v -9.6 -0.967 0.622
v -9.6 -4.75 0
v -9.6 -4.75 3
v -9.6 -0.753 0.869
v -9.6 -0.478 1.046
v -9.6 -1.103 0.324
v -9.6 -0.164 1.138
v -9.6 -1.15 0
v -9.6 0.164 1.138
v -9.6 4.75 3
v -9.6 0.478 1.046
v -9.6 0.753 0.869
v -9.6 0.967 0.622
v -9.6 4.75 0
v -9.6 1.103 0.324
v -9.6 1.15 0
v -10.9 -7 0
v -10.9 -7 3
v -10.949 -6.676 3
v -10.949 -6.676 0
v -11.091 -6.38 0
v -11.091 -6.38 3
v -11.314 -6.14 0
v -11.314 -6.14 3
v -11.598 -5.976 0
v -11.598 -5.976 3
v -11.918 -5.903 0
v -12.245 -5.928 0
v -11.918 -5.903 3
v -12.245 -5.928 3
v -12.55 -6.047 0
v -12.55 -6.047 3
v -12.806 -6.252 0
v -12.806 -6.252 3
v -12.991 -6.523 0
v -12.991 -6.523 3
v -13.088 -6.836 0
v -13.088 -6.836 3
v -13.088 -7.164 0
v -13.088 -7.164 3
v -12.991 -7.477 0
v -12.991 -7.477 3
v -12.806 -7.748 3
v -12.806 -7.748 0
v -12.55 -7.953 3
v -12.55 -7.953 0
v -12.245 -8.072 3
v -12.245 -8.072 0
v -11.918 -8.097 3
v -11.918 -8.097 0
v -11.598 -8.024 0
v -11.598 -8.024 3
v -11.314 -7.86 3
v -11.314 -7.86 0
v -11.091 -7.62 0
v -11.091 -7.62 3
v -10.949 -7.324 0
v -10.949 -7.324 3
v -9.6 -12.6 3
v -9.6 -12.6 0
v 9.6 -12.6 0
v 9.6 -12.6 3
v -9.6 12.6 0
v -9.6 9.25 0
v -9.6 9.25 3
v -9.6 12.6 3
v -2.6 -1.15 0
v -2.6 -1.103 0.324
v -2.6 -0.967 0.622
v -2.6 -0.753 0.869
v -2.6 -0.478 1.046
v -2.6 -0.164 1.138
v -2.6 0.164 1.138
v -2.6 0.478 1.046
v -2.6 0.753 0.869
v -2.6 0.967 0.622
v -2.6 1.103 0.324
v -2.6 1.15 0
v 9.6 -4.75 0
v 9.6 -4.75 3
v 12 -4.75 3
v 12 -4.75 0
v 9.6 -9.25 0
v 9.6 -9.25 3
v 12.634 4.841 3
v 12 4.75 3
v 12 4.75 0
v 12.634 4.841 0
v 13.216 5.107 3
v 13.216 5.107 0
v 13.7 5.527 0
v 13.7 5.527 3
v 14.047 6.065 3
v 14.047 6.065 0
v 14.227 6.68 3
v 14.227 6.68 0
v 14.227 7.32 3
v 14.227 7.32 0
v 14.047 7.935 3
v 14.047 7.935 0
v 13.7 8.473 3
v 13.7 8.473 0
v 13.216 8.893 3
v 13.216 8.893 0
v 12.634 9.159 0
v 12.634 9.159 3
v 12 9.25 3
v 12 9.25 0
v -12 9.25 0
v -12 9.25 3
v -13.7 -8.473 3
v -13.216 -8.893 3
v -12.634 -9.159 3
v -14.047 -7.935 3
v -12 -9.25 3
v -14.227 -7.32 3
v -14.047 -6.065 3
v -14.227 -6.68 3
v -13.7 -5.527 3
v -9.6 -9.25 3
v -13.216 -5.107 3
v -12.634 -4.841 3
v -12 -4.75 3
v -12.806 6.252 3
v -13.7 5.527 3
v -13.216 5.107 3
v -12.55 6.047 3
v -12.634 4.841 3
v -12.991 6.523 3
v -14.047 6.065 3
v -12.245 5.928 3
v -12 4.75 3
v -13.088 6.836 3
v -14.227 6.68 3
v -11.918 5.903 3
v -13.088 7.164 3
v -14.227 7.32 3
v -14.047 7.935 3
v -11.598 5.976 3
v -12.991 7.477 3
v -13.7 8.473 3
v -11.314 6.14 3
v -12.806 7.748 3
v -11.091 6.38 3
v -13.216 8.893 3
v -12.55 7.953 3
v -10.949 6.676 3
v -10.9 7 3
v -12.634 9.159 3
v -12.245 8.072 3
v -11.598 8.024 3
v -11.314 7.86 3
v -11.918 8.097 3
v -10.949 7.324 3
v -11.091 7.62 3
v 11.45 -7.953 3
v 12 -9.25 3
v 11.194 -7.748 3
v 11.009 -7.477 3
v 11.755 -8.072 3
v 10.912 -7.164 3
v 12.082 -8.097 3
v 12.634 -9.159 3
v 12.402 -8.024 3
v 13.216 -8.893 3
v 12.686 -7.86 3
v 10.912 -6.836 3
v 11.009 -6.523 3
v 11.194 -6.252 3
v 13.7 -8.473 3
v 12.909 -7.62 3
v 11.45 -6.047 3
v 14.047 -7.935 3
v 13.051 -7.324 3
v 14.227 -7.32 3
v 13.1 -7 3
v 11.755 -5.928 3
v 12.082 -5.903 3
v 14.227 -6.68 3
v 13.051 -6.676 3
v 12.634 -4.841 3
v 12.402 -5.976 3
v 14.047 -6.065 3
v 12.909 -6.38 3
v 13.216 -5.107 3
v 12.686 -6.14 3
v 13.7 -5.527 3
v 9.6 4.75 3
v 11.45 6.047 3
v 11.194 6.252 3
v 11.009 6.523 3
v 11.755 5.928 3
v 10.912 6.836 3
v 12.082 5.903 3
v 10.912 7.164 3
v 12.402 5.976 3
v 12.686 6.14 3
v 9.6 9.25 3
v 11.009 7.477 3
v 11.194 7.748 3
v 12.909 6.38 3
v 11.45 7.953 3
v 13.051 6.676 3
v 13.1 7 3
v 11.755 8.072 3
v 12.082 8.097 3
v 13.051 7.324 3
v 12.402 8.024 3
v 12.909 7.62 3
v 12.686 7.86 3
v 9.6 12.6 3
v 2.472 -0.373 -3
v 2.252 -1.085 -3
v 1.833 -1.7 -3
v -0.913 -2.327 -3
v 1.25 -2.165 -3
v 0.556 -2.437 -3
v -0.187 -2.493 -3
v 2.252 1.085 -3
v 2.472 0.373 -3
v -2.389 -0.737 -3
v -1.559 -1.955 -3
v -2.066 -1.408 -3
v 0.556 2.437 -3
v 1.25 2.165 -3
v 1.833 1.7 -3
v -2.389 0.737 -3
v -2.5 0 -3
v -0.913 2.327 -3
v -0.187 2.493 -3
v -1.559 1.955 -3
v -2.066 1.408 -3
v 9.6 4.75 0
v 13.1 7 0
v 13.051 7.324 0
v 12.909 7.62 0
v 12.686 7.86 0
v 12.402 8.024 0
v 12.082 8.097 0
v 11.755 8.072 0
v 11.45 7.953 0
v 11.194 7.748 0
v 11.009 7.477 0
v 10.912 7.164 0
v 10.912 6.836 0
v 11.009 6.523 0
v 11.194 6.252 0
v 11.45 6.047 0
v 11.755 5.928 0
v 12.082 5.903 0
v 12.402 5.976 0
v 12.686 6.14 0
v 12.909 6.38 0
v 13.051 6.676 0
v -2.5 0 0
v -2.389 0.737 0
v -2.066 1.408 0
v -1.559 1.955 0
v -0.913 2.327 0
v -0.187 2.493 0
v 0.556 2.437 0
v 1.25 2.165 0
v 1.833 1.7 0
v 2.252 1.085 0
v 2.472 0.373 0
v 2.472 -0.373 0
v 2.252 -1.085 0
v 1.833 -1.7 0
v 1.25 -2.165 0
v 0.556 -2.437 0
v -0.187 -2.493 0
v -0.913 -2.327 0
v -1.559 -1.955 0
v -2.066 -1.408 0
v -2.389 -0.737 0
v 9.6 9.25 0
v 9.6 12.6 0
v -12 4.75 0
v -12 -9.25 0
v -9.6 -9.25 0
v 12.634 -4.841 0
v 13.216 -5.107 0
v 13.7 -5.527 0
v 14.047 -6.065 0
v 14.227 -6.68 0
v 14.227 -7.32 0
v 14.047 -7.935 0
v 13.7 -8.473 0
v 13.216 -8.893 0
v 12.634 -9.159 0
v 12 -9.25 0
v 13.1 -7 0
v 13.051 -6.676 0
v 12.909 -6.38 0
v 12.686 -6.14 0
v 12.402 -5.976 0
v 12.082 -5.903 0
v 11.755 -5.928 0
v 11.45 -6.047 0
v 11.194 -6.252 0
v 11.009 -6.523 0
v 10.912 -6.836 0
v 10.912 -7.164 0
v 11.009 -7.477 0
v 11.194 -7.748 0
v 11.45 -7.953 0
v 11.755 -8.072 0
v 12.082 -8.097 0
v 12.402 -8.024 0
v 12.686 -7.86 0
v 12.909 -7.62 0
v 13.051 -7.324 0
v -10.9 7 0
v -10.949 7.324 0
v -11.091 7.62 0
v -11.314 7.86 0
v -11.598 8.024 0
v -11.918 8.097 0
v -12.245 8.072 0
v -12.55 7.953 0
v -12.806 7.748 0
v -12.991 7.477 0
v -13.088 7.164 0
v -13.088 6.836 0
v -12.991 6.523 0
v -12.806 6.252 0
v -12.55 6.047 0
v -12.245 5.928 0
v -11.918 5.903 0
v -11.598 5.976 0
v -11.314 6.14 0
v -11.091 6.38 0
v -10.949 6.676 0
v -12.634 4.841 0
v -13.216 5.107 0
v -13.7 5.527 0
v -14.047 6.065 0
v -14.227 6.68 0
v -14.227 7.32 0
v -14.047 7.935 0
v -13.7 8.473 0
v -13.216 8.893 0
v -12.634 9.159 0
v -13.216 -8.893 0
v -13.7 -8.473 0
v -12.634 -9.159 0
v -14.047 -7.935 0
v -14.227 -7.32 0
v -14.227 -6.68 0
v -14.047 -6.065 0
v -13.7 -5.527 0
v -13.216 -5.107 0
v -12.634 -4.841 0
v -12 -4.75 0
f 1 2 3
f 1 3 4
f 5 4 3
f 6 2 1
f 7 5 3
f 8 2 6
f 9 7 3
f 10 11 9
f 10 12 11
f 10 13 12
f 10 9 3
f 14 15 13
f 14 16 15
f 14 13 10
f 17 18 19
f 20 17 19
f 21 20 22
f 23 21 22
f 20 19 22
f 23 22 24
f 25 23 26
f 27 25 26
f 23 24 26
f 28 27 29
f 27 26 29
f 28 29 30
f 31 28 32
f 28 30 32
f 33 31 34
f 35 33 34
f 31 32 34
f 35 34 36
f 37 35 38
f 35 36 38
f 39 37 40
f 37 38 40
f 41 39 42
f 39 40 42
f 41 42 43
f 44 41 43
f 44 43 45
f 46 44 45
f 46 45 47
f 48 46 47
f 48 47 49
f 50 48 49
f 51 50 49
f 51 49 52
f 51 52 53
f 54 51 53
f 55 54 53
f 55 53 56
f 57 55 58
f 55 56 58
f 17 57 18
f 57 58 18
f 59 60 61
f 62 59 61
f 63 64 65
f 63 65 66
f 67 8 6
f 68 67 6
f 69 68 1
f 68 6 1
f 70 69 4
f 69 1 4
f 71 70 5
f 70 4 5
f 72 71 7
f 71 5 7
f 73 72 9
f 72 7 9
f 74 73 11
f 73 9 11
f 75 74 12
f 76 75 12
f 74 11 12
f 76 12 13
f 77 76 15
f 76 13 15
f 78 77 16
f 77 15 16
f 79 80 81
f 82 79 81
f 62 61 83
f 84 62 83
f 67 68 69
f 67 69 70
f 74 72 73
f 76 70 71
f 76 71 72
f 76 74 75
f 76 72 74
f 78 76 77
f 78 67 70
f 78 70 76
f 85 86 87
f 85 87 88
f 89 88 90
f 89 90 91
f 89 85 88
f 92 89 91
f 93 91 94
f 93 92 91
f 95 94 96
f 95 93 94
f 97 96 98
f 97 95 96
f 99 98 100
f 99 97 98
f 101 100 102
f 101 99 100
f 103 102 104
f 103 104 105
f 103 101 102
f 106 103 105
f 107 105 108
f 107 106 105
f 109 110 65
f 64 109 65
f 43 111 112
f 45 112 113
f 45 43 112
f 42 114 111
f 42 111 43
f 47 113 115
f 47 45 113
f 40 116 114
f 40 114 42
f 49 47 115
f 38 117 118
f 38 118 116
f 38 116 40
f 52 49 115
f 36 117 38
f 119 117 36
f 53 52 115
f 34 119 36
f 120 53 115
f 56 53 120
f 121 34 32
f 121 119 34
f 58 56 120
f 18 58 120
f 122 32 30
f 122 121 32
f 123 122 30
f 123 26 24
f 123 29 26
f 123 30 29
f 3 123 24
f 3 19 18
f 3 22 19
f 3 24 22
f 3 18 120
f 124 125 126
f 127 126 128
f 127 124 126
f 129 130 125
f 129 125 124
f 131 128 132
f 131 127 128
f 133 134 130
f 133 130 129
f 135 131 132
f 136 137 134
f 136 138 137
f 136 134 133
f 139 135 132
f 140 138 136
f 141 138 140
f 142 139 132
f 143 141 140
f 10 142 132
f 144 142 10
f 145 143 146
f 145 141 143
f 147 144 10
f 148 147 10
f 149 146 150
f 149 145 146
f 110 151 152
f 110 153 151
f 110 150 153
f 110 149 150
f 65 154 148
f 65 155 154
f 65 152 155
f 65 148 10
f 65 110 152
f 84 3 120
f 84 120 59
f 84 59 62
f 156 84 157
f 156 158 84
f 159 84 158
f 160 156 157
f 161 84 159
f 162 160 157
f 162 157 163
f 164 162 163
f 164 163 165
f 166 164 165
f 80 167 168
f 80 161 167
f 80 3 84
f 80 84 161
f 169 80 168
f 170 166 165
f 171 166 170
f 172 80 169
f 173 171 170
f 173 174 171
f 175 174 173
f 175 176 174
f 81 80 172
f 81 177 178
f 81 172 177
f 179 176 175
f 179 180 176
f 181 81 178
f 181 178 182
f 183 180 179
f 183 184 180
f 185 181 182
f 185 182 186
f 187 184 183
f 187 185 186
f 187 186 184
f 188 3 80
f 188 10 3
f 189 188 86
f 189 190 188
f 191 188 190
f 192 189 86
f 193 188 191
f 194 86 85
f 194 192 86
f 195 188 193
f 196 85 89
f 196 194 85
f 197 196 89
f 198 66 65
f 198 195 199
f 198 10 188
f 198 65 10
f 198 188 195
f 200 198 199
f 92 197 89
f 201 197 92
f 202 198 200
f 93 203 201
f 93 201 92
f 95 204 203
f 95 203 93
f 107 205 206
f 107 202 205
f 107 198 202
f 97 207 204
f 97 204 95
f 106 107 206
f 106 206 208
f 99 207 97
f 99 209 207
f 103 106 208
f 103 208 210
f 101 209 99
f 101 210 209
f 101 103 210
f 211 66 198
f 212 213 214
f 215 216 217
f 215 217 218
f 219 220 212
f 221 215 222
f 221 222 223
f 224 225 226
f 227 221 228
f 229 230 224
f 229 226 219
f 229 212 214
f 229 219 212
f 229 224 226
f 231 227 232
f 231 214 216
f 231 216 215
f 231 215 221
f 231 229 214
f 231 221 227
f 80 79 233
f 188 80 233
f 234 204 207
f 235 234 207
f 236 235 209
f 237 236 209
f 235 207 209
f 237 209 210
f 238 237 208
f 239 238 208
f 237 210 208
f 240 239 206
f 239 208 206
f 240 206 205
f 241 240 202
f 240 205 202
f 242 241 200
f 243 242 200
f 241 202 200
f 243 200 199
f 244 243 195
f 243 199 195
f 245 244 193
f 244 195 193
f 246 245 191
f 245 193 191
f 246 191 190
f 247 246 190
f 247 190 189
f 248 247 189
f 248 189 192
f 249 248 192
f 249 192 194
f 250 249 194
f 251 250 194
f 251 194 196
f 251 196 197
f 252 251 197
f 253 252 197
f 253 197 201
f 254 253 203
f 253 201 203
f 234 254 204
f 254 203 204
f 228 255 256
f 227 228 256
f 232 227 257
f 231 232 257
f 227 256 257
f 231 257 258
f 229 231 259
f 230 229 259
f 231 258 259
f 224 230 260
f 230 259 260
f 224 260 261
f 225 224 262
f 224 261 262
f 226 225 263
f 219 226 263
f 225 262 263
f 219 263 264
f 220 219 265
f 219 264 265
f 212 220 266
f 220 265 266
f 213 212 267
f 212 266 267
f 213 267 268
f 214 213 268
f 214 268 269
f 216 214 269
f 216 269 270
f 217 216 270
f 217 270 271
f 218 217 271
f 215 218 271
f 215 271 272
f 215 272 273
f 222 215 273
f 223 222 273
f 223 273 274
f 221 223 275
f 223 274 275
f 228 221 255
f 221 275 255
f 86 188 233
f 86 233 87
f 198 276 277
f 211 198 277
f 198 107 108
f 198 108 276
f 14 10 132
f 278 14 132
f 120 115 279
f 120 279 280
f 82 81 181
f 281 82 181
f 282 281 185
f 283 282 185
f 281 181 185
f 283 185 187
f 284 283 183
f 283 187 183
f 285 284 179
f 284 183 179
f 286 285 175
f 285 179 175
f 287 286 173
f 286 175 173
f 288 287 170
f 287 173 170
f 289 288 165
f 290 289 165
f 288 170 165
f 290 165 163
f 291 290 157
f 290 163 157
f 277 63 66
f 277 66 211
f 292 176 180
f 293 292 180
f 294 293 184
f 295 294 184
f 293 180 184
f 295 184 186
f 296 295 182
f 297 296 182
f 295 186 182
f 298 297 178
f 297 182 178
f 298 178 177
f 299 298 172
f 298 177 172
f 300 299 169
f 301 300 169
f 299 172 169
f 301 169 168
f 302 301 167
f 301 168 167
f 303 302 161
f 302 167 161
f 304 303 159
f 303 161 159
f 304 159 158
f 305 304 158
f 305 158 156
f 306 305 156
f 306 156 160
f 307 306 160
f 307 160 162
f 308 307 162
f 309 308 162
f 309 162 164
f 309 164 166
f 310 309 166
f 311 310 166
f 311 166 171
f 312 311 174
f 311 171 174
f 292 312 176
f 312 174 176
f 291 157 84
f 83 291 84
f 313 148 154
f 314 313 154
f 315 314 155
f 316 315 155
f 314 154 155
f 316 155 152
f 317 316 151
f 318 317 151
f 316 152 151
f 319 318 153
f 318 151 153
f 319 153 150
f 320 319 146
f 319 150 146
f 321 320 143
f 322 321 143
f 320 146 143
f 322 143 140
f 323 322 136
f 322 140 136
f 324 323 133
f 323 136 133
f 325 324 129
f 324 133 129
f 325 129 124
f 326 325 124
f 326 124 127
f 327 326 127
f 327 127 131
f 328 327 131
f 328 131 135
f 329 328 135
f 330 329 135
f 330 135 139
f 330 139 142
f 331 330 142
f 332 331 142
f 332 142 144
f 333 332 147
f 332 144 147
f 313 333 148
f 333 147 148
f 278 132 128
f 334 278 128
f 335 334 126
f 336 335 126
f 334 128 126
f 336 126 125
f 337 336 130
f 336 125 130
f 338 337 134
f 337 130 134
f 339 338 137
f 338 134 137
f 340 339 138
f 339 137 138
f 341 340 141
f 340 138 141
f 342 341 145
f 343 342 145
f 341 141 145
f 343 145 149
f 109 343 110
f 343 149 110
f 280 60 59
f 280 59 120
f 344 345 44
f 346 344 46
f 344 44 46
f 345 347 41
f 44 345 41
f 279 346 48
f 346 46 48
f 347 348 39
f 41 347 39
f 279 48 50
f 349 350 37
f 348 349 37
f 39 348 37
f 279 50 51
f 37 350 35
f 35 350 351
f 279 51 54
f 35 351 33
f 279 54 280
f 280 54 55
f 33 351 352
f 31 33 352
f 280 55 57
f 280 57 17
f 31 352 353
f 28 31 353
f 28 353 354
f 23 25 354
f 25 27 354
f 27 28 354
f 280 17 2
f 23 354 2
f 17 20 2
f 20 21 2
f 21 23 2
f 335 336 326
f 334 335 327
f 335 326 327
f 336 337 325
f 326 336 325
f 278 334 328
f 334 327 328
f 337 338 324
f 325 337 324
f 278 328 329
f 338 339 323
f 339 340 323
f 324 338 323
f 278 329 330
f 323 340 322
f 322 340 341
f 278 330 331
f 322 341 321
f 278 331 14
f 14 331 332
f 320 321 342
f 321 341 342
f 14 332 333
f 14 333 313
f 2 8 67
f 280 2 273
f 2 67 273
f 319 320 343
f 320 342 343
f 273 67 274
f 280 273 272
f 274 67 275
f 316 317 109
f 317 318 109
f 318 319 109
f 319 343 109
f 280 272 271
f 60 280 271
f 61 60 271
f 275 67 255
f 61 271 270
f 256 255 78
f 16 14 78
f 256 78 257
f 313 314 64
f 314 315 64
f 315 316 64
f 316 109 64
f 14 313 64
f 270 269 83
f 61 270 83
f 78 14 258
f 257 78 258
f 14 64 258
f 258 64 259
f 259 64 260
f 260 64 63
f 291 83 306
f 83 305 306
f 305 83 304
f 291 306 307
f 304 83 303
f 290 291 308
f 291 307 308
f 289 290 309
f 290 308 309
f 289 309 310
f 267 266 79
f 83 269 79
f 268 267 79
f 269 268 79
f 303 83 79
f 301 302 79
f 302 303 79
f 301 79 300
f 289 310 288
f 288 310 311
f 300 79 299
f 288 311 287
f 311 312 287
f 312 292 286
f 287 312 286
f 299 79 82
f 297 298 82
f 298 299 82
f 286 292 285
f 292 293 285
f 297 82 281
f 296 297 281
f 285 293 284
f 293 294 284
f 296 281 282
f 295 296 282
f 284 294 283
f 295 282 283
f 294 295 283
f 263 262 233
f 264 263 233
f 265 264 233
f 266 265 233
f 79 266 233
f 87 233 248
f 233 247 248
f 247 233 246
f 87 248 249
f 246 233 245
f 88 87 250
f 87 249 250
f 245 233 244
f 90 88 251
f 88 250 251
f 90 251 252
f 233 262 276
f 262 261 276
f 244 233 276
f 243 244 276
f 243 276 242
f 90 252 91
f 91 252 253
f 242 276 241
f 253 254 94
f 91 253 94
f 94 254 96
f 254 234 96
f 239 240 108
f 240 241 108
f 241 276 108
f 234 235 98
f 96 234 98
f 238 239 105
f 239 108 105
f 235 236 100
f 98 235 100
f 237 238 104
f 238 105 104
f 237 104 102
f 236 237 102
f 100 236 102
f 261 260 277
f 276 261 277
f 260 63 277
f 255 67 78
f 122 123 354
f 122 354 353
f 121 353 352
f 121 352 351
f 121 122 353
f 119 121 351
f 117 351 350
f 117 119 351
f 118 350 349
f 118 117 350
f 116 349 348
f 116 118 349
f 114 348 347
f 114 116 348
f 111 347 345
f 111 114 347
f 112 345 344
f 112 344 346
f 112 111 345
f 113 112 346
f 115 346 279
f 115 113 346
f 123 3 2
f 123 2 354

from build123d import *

# Parameters (mm, degrees)
SKETCH_1_W          = 19.2
SKETCH_1_H          = 25.2
EXTRUDE_1_DEPTH     = 3
SKETCH_3_R          = 1.1
EXTRUDE_2_DEPTH     = 3
SKETCH_4_R          = 1.15
CUT_EXTRUDE_1_DEPTH = 7
SKETCH_5_R          = 2.5
EXTRUDE_3_DEPTH     = 3


with BuildPart() as part:
    # 草图1 → 凸台-拉伸1 (new body)
    with BuildSketch(Plane.XY):
        Rectangle(SKETCH_1_W, SKETCH_1_H)
    extrude(amount=EXTRUDE_1_DEPTH)

    # 草图3 → 凸台-拉伸2 (add, through all)
    with BuildSketch(Plane.XY.offset(3)):
        with BuildLine():
            Line((12, 9.25), (9.6, 9.25))
            Line((9.6, 9.25), (9.6, 4.75))
            Line((9.6, 4.75), (12, 4.75))
            ThreePointArc((12, 4.75), (14.25, 7), (12, 9.25))
        make_face()
        with Locations((12, 7)):
            Circle(SKETCH_3_R, mode=Mode.SUBTRACT)
        with BuildLine():
            Line((9.6, -9.25), (9.6, -4.75))
            Line((9.6, -4.75), (12, -4.75))
            ThreePointArc((12, -4.75), (14.25, -7), (12, -9.25))
            Line((12, -9.25), (9.6, -9.25))
        make_face()
        with Locations((12, -7)):
            Circle(SKETCH_3_R, mode=Mode.SUBTRACT)
        with BuildLine():
            Line((-12, -9.25), (-9.6, -9.25))
            Line((-9.6, -9.25), (-9.6, -4.75))
            Line((-9.6, -4.75), (-12, -4.75))
            ThreePointArc((-12, -4.75), (-14.25, -7), (-12, -9.25))
        make_face()
        with Locations((-12, -7)):
            Circle(SKETCH_3_R, mode=Mode.SUBTRACT)
        with BuildLine():
            Line((-9.6, 9.25), (-9.6, 4.75))
            Line((-9.6, 4.75), (-12, 4.75))
            ThreePointArc((-12, 4.75), (-14.25, 7), (-12, 9.25))
            Line((-12, 9.25), (-9.6, 9.25))
        make_face()
        with Locations((-12, 7)):
            Circle(SKETCH_3_R, mode=Mode.SUBTRACT)
    extrude_2 = extrude(amount=-EXTRUDE_2_DEPTH)

    # 镜向1: 凸台-拉伸2 across plane
    add(extrude_2.mirror(Plane.ZX))

    # 草图4 → 切除-拉伸1 (cut)
    with BuildSketch(Plane(origin=(-9.6, 3, 0), x_dir=(0, 1, 0), z_dir=(-1, 0, 0))):
        with Locations((-3, 0)):
            Circle(SKETCH_4_R)
    extrude(amount=-CUT_EXTRUDE_1_DEPTH, mode=Mode.SUBTRACT)

    # 草图5 → 凸台-拉伸3 (add)
    with BuildSketch(Plane(origin=(0, 0, 0), x_dir=(-1, 0, 0), z_dir=(0, 0, -1))):
        Circle(SKETCH_5_R)
    extrude(amount=EXTRUDE_3_DEPTH)


solid = part.part
